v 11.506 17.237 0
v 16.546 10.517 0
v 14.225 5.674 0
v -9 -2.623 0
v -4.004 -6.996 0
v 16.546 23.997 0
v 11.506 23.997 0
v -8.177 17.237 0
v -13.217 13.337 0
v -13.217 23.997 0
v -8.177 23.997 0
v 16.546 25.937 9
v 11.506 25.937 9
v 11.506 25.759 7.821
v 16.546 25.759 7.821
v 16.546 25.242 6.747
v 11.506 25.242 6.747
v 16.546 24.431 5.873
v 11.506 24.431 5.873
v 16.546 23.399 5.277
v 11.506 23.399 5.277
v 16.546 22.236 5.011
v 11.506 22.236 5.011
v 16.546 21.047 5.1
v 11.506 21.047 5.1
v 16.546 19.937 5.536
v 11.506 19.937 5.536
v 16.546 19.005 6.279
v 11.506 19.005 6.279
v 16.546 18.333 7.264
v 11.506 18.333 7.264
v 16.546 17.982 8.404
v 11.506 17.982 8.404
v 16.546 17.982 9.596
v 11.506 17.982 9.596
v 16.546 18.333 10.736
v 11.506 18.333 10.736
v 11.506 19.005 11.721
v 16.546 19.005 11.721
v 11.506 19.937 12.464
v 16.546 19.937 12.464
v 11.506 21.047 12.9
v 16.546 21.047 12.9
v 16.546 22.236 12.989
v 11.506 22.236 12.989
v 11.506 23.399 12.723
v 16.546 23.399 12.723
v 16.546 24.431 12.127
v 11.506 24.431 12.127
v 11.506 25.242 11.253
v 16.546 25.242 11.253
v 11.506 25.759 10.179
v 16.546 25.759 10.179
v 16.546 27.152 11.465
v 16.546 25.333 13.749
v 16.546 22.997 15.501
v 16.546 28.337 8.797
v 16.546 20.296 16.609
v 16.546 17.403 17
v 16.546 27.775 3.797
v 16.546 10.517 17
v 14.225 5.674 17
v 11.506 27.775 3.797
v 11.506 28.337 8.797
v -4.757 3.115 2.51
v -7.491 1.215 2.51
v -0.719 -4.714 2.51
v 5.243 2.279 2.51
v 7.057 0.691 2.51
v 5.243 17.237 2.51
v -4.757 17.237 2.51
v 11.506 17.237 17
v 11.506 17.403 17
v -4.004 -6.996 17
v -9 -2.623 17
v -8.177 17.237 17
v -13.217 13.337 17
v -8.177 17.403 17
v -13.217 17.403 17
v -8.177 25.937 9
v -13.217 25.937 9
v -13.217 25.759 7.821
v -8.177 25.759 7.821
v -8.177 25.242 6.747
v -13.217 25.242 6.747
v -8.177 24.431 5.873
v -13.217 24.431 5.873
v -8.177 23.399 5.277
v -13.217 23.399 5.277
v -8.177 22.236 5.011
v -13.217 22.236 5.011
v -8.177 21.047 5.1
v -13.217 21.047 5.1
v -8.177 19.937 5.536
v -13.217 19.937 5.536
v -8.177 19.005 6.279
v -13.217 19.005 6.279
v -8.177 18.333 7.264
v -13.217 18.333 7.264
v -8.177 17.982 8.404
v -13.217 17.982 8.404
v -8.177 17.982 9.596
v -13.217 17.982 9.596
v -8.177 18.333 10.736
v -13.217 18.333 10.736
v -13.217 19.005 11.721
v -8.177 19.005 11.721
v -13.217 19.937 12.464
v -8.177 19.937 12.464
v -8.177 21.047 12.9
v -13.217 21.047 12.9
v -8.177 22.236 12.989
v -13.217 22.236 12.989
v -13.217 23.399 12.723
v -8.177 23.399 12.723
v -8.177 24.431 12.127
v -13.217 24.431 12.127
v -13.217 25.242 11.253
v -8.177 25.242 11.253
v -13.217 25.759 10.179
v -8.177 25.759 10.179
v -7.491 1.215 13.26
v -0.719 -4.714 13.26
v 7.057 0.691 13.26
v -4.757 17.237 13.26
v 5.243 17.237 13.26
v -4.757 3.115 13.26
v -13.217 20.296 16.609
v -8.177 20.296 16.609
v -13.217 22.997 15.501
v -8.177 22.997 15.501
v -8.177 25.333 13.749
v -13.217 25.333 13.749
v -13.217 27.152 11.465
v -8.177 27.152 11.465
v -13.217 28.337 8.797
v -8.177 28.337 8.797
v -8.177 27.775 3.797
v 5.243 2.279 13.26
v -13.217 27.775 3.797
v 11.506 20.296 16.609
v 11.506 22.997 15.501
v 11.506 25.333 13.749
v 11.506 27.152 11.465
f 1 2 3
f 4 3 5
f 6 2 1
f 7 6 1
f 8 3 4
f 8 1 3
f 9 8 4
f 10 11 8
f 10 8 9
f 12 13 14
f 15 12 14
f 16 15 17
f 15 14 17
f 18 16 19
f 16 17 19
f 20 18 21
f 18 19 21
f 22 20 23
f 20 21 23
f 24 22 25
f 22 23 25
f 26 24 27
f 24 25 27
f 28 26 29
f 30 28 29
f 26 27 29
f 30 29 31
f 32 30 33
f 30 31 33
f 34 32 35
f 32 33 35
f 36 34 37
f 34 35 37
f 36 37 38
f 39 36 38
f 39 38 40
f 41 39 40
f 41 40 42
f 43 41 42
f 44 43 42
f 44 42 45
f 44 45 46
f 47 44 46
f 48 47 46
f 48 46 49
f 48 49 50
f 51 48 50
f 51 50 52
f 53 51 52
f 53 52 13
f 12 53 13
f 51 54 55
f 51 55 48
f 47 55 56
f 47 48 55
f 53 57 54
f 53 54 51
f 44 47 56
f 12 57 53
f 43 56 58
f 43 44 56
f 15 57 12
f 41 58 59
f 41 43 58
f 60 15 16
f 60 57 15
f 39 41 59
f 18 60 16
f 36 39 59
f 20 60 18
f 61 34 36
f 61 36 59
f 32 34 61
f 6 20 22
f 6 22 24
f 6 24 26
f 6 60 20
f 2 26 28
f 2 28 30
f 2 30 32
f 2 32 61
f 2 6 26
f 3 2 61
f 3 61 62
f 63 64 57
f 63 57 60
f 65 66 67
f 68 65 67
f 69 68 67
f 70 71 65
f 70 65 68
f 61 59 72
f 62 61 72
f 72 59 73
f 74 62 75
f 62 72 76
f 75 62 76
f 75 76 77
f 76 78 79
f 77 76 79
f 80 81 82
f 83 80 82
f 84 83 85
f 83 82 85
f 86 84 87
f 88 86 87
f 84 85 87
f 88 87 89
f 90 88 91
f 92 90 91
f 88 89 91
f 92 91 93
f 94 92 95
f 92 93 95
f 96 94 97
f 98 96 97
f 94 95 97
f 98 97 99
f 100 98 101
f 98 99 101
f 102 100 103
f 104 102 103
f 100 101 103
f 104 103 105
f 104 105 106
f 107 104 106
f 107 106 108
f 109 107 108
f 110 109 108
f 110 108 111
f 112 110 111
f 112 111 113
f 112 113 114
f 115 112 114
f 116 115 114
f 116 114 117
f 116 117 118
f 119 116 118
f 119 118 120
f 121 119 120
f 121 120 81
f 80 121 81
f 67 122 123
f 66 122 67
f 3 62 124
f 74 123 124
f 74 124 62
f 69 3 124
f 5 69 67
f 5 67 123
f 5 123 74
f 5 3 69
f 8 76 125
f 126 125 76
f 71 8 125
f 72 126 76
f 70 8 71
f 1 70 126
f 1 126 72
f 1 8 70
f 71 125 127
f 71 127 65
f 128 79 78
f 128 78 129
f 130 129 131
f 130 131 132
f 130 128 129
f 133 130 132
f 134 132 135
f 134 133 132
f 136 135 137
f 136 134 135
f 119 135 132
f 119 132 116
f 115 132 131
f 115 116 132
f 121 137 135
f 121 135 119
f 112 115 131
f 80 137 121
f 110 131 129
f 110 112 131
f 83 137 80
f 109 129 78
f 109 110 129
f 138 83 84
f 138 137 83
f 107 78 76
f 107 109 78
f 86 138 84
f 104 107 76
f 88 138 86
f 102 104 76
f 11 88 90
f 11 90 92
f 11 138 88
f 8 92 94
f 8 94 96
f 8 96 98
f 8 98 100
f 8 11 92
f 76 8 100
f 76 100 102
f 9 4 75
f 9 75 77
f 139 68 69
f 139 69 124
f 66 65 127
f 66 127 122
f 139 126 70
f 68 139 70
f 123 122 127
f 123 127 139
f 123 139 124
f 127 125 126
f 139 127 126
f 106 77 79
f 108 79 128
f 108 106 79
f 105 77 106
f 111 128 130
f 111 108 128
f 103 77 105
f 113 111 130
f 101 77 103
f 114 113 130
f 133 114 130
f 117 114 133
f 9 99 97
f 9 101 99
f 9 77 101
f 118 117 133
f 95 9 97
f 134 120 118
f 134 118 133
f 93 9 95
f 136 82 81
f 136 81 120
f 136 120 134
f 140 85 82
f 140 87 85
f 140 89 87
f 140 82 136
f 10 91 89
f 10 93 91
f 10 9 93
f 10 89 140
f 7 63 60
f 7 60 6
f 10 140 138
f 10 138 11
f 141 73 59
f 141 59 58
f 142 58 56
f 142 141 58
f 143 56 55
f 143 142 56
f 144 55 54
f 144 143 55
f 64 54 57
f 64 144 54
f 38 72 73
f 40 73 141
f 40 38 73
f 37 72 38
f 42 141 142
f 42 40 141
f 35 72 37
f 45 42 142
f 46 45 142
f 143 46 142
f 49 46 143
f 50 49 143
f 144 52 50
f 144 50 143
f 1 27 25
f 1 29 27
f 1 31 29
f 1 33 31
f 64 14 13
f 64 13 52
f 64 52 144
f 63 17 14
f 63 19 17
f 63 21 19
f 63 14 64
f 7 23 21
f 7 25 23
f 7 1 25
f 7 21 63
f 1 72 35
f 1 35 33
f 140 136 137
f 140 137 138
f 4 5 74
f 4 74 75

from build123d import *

# Parameters (mm, degrees)
BOSS_EXTRUDE1_DEPTH     = 17
CUT_EXTRUDE3_DEPTH      = 27
CUT_EXTRUDE3_DEPTH_BACK = 17
SKETCH5_W               = 9.47
SKETCH5_H               = 10.75
CUT_EXTRUDE4_REACH      = 35.912
SKETCH7_W               = 10
SKETCH7_H               = 10.75
SKETCH8_R               = 4
CUT_EXTRUDE5_DEPTH      = 37


with BuildPart() as part:
    # Sketch1 → Boss-Extrude1 (new body)
    with BuildSketch(Plane.XY):
        Polygon((-13.217142857, 28.337142857), (-8.177142857, 28.337142857), (-8.177142857, 17.237142857), (11.505594759, 17.237142857), (11.505594759, 28.337142857), (16.545594759, 28.337142857), (16.545594759, 10.516618894), (14.225387594, 5.673733524), (-4.003880739, -6.9964589), (-9, -2.622857143), (-13.217142857, 13.337142857), align=None)
    extrude(amount=BOSS_EXTRUDE1_DEPTH)

    # Sketch4 → Cut-Extrude3 (cut, two sides: drawn at the far end of the back side and taken through both)
    with BuildSketch(Plane(origin=(-8.177142857, 0, 0), x_dir=(0, 0, -1), z_dir=(1, 0, 0)).offset(-CUT_EXTRUDE3_DEPTH_BACK)):
        with BuildLine():
            Line((-17, 28.337142857), (-17, 17.4025989))
            ThreePointArc((-17, 17.4025989), (-14.6995428, 24.220877118), (-8.797223125, 28.337142857))
            Line((-8.797223125, 28.337142857), (-17, 28.337142857))
        make_face()
        Polygon((-3.797223125, 27.774535639), (0, 23.997142857), (0, 28.337142857), (-8.797223125, 28.337142857), align=None)
    extrude(amount=CUT_EXTRUDE3_DEPTH + CUT_EXTRUDE3_DEPTH_BACK, mode=Mode.SUBTRACT)

    # Cut-Sweep1: sweep along a path in Sketch6
    with BuildLine(Plane.XY.offset(10)) as cut_sweep1_path:
        Line((0.85151547, -3.621731888), (-5.920332926, 2.306342783))
    # Sketch5 → Cut-Sweep1 (sweep, cut)
    with BuildSketch(Plane(origin=(1.974682223, -2.841078565, 0), x_dir=(0.8211382131865097, 0.5707293884538155, 0), z_dir=(0.5707293884538155, -0.8211382131865098, 0))):
        with Locations((1.454175815, 7.885)):
            Rectangle(SKETCH5_W, SKETCH5_H)
    sweep(path=cut_sweep1_path.line, mode=Mode.SUBTRACT)

    # Cut-Extrude4: up to this face of the body (flat: up to its plane)
    cut_extrude4_end = Plane(part.part.faces().sort_by_distance((-4.105252084, -1.749504011, 7.885))[0])
    # Sketch7 → Cut-Extrude4 (cut, up to the picked face)
    with BuildSketch(Plane(origin=(0, 17.237142857, 0), x_dir=(1, 0, 0), z_dir=(0, 1, 0)), mode=Mode.PRIVATE) as cut_extrude4_sk1:
        with Locations((0.242857143, -7.885)):
            Rectangle(SKETCH7_W, SKETCH7_H)
    cut_extrude4_tool1 = split(extrude(cut_extrude4_sk1.sketch, amount=-CUT_EXTRUDE4_REACH, mode=Mode.PRIVATE), bisect_by=cut_extrude4_end, keep=Keep.BOTH, mode=Mode.PRIVATE)
    add(cut_extrude4_tool1.solids().sort_by(Axis((0.242857, 17.237143, 7.885), (0, -1, 0)))[0], mode=Mode.SUBTRACT)

    # Sketch8 → Cut-Extrude5 (cut)
    with BuildSketch(Plane.ZY.offset(13.217142857)):
        with Locations(Location((9, 21.937142857, 0), (0, 0, 90))):
            Circle(SKETCH8_R)
    extrude(amount=-CUT_EXTRUDE5_DEPTH, mode=Mode.SUBTRACT)


solid = part.part
